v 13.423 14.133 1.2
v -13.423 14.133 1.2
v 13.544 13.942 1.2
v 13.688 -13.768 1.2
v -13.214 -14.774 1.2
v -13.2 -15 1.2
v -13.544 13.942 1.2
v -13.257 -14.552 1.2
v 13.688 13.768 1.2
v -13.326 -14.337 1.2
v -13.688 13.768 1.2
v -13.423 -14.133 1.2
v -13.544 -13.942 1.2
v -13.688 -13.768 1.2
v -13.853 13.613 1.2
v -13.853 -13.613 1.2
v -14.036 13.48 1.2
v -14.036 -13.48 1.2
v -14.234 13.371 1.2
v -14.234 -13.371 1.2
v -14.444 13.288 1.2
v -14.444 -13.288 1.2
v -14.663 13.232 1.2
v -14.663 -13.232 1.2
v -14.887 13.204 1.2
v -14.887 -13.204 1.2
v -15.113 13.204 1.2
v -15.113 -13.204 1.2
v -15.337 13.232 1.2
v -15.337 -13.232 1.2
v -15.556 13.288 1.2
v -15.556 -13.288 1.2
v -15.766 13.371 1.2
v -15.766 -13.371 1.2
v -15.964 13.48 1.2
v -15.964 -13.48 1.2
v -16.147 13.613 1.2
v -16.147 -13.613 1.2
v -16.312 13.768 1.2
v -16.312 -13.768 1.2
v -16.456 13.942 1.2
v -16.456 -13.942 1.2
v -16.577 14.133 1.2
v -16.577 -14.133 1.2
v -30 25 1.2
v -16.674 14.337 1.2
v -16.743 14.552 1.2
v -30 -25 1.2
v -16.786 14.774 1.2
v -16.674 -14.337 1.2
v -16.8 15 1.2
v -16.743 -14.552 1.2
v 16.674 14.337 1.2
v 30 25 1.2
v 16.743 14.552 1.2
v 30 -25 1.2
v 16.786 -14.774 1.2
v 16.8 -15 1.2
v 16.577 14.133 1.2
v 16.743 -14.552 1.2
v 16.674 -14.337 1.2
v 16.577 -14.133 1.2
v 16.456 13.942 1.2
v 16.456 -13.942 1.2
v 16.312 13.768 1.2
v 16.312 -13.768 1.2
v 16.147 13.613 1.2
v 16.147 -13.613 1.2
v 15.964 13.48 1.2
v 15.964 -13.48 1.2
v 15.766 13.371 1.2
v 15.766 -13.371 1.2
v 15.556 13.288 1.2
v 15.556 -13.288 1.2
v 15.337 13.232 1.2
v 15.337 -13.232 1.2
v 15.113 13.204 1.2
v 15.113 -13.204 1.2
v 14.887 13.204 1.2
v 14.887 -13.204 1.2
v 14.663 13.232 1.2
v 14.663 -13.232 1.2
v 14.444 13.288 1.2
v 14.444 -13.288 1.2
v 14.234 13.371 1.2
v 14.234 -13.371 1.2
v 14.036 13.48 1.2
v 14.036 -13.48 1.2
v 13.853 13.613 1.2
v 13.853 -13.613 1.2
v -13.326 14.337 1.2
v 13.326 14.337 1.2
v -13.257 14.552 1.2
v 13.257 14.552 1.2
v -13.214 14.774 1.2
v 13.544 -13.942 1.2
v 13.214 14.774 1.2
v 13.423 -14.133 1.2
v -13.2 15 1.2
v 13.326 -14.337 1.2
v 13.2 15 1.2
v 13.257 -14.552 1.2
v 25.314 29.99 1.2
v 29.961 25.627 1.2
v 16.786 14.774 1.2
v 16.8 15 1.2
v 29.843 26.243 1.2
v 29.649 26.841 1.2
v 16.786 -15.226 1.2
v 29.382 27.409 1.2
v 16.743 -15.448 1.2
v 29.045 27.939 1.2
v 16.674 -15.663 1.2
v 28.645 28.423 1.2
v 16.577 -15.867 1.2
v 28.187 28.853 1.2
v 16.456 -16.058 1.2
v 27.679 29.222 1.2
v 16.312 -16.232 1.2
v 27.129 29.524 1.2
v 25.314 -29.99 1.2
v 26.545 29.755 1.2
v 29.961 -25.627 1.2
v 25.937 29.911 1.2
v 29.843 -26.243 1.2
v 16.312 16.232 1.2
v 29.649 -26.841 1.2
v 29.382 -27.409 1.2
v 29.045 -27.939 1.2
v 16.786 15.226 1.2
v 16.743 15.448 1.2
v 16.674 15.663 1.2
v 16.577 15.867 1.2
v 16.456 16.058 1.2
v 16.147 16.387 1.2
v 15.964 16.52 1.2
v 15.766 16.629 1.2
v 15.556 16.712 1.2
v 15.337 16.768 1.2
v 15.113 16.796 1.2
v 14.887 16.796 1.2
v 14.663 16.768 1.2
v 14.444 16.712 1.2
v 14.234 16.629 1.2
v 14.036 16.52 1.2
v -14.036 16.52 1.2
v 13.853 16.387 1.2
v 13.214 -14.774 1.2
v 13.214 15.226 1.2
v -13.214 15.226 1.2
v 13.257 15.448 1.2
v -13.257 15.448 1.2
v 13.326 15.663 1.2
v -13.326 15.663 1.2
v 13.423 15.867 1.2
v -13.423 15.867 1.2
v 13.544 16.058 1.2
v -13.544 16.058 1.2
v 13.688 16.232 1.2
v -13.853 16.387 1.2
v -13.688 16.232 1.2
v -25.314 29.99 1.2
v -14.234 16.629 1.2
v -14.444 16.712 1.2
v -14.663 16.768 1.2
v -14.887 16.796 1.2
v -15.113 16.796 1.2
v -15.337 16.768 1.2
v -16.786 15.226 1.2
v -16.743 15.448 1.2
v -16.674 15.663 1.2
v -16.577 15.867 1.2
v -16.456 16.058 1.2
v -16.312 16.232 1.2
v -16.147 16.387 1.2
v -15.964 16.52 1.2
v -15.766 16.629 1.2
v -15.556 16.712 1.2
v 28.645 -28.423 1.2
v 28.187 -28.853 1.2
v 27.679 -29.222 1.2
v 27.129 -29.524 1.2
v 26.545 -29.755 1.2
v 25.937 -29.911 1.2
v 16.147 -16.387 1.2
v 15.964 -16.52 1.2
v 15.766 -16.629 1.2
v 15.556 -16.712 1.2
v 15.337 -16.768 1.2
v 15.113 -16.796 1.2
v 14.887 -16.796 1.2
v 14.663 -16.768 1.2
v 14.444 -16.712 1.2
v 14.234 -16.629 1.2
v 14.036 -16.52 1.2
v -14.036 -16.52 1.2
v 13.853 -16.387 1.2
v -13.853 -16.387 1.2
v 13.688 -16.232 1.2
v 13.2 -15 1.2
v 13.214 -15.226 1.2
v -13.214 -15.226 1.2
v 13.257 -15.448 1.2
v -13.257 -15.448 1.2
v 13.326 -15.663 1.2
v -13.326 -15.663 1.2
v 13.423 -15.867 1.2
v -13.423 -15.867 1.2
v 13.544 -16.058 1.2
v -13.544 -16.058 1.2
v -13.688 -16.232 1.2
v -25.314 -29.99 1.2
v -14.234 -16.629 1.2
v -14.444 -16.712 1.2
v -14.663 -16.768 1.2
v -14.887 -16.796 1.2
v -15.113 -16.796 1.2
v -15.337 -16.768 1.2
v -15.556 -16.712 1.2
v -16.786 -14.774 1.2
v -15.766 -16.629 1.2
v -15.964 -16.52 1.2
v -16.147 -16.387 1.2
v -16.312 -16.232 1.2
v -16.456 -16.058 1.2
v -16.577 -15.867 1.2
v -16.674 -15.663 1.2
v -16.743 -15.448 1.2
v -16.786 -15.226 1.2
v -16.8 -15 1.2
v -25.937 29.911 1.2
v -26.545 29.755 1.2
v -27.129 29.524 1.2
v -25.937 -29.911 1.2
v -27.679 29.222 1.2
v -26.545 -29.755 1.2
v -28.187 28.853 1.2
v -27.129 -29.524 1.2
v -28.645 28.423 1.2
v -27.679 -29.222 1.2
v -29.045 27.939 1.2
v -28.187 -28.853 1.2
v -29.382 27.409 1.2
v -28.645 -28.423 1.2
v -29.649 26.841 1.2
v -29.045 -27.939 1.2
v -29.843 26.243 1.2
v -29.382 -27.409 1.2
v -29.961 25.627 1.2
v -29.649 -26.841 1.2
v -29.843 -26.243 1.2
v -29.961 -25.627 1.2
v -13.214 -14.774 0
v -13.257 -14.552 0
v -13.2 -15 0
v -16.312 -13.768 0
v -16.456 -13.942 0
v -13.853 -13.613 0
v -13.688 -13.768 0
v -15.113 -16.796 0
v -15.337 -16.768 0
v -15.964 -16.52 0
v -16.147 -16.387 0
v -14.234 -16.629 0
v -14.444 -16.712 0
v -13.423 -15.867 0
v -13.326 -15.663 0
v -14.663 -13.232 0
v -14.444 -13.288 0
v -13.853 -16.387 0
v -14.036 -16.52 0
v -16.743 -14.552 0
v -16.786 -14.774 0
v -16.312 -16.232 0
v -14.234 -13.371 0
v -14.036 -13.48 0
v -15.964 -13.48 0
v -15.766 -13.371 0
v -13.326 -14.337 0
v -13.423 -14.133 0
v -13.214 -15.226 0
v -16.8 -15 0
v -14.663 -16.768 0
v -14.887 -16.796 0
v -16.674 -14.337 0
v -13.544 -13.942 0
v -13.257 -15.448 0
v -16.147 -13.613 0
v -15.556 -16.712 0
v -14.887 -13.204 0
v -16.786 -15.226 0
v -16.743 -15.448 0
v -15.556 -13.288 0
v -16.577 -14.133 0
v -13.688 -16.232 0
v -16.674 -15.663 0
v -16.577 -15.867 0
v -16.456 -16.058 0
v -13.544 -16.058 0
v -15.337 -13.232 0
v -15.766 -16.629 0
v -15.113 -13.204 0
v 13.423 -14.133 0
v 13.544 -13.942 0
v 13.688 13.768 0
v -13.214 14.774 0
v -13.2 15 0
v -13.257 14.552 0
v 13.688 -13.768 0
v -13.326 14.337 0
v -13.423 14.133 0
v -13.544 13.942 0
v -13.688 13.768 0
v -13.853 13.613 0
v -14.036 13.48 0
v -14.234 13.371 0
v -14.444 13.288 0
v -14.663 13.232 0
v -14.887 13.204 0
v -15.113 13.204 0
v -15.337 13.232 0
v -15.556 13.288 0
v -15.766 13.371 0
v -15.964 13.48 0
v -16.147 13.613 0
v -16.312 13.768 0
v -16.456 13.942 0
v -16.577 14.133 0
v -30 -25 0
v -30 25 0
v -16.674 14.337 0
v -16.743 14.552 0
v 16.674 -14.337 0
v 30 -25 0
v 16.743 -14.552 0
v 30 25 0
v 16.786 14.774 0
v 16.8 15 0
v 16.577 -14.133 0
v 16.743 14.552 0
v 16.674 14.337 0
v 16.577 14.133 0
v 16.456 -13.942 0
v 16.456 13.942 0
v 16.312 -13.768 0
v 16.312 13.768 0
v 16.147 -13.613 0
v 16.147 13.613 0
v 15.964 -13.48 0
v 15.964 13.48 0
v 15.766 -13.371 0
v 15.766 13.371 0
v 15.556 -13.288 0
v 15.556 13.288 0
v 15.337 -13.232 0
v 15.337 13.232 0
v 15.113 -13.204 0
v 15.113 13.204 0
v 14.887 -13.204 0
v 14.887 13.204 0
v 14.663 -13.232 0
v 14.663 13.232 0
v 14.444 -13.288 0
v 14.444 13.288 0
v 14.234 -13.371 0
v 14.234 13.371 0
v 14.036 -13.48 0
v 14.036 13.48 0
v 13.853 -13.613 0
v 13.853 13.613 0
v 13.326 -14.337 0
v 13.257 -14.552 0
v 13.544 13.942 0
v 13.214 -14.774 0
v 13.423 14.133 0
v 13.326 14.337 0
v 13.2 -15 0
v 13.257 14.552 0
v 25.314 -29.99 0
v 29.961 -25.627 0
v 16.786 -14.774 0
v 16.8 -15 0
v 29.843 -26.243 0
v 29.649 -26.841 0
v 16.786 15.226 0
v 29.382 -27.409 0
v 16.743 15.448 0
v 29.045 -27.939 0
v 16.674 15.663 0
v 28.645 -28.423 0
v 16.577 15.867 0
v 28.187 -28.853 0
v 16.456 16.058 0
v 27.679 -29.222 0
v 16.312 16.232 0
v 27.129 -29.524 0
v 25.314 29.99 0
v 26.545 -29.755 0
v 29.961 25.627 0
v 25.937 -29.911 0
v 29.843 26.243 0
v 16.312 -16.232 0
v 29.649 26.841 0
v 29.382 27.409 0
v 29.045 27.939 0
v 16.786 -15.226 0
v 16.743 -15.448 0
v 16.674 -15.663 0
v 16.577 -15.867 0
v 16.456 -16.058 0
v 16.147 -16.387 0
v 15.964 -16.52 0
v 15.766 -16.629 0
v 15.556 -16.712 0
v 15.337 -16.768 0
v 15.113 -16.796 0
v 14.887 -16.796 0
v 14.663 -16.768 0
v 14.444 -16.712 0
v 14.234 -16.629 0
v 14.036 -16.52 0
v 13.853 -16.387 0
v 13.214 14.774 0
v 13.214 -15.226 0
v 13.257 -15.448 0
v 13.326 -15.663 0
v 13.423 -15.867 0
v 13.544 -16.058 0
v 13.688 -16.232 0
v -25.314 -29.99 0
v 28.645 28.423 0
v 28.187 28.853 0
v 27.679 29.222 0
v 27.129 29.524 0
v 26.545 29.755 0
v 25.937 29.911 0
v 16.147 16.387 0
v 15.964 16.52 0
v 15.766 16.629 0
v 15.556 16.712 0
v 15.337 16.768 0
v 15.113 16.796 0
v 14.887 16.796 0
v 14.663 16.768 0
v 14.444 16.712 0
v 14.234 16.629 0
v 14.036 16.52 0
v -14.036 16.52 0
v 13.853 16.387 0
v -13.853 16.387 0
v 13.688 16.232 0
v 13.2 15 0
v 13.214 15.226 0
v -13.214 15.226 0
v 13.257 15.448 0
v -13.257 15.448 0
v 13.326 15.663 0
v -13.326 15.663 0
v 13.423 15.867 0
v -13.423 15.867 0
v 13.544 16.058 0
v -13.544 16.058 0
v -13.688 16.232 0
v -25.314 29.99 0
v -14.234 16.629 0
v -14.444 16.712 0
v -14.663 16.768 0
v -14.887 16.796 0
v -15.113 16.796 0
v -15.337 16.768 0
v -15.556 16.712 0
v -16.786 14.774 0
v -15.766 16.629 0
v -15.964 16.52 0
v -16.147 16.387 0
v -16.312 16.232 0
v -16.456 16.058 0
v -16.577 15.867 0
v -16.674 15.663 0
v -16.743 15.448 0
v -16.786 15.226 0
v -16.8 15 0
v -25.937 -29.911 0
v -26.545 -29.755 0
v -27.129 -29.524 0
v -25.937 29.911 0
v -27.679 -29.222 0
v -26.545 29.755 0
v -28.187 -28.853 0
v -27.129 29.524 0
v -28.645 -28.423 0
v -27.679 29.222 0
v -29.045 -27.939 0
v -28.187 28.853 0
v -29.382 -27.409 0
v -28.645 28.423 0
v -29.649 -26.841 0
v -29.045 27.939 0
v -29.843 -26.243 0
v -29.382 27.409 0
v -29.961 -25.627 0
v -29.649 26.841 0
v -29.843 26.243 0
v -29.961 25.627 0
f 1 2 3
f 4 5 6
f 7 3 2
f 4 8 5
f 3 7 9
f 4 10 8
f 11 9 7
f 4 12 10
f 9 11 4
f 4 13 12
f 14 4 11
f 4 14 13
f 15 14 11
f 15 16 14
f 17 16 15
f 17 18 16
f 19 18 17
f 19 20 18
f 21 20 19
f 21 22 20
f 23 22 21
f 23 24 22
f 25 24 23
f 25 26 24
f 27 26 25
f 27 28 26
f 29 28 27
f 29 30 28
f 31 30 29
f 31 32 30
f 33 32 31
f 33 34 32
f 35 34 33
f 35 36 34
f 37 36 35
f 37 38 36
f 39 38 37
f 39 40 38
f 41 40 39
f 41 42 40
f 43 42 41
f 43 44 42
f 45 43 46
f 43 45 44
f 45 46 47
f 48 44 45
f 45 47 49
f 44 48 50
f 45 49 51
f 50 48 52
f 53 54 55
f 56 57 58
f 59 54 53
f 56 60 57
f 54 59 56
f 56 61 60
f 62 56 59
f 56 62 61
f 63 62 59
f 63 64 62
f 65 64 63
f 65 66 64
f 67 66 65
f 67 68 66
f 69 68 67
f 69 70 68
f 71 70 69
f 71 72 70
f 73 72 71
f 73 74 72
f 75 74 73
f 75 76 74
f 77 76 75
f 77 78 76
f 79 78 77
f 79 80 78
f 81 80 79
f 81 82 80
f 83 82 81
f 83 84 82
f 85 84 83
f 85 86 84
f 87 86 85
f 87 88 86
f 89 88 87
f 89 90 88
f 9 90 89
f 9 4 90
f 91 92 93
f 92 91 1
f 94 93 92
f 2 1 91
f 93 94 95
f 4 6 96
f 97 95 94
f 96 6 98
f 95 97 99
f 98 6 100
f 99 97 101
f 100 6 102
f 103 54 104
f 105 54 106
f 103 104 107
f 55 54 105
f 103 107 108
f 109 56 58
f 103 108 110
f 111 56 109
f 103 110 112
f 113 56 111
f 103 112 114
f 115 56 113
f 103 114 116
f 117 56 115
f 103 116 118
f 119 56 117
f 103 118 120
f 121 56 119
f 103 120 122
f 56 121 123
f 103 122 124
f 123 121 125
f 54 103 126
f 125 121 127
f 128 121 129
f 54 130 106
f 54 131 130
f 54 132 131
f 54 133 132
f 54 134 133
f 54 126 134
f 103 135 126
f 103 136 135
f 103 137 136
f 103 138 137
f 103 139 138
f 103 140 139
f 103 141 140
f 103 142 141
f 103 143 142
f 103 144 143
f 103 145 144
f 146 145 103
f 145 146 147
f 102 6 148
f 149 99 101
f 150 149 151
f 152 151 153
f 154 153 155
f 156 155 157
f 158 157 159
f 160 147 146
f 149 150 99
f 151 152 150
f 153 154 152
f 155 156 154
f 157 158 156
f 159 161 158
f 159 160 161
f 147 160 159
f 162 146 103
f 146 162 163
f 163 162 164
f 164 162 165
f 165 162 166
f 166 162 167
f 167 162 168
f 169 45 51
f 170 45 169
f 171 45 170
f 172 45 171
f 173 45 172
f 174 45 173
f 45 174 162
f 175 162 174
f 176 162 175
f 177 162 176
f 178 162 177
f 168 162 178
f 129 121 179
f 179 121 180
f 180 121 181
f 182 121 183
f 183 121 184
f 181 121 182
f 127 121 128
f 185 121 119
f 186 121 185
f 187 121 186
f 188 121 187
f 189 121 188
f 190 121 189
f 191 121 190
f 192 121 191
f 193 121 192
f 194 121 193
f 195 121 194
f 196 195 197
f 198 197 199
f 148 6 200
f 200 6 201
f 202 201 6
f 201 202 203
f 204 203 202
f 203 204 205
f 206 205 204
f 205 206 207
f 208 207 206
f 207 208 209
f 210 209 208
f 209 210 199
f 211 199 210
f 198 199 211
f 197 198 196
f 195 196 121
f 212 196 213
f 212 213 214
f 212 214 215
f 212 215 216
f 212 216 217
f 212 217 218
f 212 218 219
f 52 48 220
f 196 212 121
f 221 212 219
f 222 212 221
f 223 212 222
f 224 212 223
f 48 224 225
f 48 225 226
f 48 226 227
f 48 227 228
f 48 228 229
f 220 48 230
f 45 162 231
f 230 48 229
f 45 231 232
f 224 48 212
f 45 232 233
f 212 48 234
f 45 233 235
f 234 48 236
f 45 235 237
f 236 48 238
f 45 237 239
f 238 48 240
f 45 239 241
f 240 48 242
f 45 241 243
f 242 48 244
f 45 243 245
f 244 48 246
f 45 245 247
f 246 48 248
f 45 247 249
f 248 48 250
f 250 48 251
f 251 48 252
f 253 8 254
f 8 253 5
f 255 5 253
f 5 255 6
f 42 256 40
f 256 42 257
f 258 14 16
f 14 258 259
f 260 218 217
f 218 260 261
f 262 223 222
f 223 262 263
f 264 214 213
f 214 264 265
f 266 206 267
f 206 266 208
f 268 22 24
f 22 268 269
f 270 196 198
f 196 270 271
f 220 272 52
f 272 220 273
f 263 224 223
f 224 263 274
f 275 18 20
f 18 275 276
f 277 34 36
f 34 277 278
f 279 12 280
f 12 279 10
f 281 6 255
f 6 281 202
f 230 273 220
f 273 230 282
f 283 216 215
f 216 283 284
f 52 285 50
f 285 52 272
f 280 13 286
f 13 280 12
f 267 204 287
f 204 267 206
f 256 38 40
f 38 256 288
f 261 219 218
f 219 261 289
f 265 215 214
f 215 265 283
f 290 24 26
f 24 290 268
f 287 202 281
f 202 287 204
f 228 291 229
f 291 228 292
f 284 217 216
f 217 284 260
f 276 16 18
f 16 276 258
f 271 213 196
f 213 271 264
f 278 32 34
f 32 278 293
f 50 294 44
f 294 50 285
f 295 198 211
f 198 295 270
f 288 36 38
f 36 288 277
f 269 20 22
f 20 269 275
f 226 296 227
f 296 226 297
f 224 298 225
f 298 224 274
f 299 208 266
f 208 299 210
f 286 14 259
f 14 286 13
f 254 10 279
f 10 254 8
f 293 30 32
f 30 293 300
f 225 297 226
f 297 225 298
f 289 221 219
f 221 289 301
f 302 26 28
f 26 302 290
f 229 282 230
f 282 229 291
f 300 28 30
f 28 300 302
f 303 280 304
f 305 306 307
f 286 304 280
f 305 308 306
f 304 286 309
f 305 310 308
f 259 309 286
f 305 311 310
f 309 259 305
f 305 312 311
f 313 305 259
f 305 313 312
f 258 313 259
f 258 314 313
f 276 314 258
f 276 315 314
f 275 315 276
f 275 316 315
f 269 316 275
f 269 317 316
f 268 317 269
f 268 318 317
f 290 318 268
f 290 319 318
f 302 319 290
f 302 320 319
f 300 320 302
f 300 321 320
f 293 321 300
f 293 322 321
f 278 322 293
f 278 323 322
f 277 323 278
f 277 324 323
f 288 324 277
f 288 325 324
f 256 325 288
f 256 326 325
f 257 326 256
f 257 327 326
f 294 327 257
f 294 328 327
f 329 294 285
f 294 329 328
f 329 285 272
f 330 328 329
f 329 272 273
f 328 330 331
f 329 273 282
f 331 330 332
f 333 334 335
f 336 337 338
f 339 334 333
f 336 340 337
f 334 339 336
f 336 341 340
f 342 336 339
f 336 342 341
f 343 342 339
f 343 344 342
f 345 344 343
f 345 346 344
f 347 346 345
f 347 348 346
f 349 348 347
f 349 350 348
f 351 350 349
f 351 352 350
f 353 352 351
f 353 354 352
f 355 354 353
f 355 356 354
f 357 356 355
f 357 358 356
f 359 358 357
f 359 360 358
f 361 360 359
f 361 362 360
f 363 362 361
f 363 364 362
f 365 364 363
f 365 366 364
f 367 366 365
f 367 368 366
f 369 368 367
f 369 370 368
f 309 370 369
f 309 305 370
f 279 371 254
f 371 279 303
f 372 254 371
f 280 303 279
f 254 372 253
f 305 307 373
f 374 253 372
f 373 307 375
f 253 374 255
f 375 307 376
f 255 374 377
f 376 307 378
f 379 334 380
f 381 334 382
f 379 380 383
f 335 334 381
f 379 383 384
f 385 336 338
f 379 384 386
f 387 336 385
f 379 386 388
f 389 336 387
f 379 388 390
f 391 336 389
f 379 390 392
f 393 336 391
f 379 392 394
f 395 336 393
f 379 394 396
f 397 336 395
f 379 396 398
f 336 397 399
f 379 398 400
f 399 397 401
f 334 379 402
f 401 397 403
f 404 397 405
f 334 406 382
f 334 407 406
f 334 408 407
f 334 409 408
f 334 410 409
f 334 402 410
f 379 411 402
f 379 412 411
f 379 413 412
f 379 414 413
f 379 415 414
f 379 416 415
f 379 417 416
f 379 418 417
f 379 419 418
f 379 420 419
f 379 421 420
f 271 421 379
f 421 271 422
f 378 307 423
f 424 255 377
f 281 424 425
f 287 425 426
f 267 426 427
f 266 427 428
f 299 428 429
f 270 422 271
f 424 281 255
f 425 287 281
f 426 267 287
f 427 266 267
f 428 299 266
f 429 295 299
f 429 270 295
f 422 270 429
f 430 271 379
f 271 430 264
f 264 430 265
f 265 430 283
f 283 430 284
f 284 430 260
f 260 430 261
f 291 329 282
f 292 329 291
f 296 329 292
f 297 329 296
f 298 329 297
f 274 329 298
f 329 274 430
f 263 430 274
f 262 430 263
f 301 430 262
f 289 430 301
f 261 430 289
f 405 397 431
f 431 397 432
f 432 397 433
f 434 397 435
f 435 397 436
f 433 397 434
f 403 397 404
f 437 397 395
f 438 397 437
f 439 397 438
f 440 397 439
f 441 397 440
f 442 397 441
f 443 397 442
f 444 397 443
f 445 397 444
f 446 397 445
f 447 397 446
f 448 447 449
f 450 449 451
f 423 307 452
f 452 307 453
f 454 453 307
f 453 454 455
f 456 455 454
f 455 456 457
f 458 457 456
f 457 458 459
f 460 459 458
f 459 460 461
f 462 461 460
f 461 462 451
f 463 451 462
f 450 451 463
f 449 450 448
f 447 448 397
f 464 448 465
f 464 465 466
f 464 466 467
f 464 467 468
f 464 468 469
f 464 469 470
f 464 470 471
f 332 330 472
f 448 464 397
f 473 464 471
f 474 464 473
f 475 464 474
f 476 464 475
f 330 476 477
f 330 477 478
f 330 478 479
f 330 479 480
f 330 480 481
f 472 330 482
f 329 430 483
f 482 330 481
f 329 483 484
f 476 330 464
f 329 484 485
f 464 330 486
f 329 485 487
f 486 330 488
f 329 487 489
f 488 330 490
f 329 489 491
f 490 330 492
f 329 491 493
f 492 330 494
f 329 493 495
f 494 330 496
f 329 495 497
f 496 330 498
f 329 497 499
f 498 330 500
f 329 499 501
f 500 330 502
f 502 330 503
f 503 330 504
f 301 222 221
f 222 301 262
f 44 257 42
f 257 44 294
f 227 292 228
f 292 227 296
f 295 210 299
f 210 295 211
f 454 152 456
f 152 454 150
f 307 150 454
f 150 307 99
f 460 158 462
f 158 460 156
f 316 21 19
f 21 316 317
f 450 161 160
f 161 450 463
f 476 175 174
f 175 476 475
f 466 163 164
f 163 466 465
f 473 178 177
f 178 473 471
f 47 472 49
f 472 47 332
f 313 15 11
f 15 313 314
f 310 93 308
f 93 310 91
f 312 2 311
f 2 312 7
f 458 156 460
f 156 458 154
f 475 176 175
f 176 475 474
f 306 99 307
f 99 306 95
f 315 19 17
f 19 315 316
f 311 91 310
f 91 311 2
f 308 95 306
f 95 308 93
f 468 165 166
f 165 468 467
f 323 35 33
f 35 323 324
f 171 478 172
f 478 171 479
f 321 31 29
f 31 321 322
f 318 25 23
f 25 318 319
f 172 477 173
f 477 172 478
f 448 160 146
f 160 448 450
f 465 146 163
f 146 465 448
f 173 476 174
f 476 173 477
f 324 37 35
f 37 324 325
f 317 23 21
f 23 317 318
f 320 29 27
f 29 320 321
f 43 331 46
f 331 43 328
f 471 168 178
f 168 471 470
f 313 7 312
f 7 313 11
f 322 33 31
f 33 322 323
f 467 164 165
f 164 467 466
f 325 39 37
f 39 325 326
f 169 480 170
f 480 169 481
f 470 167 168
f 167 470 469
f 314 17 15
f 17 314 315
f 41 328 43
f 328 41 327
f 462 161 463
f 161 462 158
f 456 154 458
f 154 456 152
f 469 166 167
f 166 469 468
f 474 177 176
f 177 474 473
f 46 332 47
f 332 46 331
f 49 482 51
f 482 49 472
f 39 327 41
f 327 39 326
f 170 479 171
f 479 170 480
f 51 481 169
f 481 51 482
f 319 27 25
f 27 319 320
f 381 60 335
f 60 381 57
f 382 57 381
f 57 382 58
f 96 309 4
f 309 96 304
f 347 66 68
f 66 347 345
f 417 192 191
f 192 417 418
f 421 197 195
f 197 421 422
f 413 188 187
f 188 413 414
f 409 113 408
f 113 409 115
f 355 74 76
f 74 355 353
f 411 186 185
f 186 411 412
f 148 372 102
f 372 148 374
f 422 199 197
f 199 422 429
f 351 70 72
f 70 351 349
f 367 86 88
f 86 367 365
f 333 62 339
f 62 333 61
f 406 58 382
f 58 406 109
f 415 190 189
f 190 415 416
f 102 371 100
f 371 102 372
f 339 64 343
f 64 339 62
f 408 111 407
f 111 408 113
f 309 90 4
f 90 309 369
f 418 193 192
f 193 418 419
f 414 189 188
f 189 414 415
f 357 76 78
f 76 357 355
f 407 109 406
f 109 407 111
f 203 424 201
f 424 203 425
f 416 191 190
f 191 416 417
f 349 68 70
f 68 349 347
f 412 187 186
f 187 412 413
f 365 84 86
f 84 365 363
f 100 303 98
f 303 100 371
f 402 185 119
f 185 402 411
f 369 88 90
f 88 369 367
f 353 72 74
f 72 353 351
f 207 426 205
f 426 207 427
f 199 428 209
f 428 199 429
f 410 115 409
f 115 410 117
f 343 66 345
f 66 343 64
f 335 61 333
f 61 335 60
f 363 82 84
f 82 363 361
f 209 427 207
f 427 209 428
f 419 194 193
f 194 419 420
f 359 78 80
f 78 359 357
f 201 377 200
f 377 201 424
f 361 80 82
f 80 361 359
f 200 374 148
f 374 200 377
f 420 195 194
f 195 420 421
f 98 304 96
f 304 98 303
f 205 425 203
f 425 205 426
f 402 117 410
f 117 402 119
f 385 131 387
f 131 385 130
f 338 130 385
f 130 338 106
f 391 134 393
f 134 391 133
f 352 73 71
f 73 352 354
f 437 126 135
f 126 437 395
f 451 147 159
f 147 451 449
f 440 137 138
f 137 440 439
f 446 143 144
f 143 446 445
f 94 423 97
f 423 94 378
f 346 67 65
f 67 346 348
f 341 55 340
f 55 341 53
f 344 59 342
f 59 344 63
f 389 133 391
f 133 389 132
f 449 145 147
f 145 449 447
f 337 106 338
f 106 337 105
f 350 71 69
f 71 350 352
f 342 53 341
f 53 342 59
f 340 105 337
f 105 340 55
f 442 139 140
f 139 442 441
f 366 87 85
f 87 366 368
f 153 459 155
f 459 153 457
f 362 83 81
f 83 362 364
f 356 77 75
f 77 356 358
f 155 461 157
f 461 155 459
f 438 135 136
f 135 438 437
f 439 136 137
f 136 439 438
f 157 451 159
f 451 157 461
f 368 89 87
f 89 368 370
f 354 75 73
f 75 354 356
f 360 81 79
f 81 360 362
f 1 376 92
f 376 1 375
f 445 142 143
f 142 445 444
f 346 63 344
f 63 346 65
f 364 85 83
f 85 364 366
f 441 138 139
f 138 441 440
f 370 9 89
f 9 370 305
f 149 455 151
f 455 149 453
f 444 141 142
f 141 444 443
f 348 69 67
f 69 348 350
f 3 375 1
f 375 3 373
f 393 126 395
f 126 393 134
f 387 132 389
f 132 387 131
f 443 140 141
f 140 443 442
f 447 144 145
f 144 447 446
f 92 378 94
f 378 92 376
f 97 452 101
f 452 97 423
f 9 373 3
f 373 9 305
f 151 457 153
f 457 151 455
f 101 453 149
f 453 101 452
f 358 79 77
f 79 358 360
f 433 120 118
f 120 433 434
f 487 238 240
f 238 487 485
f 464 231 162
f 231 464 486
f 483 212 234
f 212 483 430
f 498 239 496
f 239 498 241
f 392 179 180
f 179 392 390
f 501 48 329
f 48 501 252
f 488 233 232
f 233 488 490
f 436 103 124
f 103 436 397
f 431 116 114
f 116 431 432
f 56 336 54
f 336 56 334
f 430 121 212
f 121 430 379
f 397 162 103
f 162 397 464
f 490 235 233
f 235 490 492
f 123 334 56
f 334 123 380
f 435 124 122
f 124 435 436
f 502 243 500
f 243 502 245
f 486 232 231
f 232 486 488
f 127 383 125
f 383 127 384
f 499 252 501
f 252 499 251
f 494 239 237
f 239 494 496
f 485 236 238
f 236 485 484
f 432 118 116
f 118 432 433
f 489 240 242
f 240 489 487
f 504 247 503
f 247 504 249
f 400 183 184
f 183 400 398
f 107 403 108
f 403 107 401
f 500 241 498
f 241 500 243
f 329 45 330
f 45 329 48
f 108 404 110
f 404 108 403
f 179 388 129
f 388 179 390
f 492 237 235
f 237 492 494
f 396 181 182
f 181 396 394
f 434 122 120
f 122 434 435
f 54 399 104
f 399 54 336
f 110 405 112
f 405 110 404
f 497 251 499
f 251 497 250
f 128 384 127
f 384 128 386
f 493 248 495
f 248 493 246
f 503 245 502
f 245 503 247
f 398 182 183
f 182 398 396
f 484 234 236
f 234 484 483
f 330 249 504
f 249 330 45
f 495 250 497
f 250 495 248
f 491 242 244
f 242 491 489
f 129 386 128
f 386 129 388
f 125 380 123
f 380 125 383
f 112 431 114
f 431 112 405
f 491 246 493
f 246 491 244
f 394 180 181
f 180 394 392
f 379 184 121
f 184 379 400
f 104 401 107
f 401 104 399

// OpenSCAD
$fn = 50;


difference() {
	union() {
		hull() {
			translate(v = [-25.0000000000, 25.0000000000, 0]) {
				cylinder(h = 99, r = 5);
			}
			translate(v = [25.0000000000, 25.0000000000, 0]) {
				cylinder(h = 99, r = 5);
			}
			translate(v = [-25.0000000000, -25.0000000000, 0]) {
				cylinder(h = 99, r = 5);
			}
			translate(v = [25.0000000000, -25.0000000000, 0]) {
				cylinder(h = 99, r = 5);
			}
		}
	}
	union() {
		translate(v = [0, 0, 1.2000000000]) {
			hull() {
				translate(v = [-25.0000000000, 25.0000000000, 0]) {
					cylinder(h = 97.8000000000, r = 3.8000000000);
				}
				translate(v = [25.0000000000, 25.0000000000, 0]) {
					cylinder(h = 97.8000000000, r = 3.8000000000);
				}
				translate(v = [-25.0000000000, -25.0000000000, 0]) {
					cylinder(h = 97.8000000000, r = 3.8000000000);
				}
				translate(v = [25.0000000000, -25.0000000000, 0]) {
					cylinder(h = 97.8000000000, r = 3.8000000000);
				}
			}
		}
		#translate(v = [-15.0000000000, -15.0000000000, 0]) {
			cylinder(h = 1.2000000000, r = 1.8000000000);
		}
		#translate(v = [-15.0000000000, 15.0000000000, 0]) {
			cylinder(h = 1.2000000000, r = 1.8000000000);
		}
		#translate(v = [15.0000000000, -15.0000000000, 0]) {
			cylinder(h = 1.2000000000, r = 1.8000000000);
		}
		#translate(v = [15.0000000000, 15.0000000000, 0]) {
			cylinder(h = 1.2000000000, r = 1.8000000000);
		}
		translate(v = [-250.0000000000, -250.0000000000, 1.2000000000]) {
			cube(size = [500, 500, 500]);
		}
		translate(v = [-250.0000000000, -250.0000000000, 1.2000000000]) {
			cube(size = [500, 500, 500]);
		}
		translate(v = [-250.0000000000, -250.0000000000, 1.2000000000]) {
			cube(size = [500, 500, 500]);
		}
	}
}
